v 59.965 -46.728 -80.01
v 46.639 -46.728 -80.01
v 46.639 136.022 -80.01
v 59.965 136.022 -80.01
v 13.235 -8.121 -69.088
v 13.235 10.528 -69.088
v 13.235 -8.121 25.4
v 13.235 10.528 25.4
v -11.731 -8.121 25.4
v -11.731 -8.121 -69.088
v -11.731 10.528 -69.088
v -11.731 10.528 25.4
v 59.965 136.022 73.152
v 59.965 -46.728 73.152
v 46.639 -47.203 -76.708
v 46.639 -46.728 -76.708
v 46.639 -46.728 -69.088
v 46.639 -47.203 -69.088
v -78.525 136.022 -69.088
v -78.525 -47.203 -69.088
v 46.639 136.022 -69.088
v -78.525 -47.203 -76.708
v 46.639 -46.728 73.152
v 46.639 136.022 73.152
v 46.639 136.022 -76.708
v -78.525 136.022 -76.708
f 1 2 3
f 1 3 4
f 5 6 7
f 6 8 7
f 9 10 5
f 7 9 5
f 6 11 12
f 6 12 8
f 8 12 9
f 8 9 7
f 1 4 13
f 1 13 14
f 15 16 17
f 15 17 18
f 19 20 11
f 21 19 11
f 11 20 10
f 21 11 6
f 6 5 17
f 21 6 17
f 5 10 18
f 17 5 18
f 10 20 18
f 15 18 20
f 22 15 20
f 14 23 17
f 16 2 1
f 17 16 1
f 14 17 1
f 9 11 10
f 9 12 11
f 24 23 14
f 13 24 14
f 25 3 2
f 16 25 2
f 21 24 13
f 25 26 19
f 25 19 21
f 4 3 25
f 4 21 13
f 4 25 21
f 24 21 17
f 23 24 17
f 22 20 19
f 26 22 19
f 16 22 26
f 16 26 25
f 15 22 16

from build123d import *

# Parameters (mm, degrees)
F0_W     = 24.9655246735
F0_H     = 18.6489485204
F1_DEPTH = 25.4
F2_W     = 24.9655246735
F2_H     = 18.6489485204
F3_DEPTH = 69.088
F4_W     = 24.9655246735
F4_H     = 18.6489485204
F5_DEPTH = 7.62
F4_W_2   = 13.3254788816
F4_H_2   = 182.7494688332
F6_DEPTH = 10.922
F7_DEPTH = 131.318


with BuildPart() as f1:
    # F0 (on Top) → F1 (new body)
    with BuildSketch(Plane.XY):
        with Locations((0.7519731298, 1.203157939)):
            Rectangle(F0_W, F0_H)
    extrude(amount=F1_DEPTH)

    # F2 (on face) → F3 (join)
    with BuildSketch(Plane(origin=(0, 0, 0), x_dir=(1, 0, 0), z_dir=(0, 0, -1))):
        with Locations((0.7519731298, -1.203157939)):
            Rectangle(F2_W, F2_H)
    extrude(amount=F3_DEPTH)

    # F4 (on face) → F5 (join)
    with BuildSketch(Plane(origin=(0, 0, -69.088), x_dir=(1, 0, 0), z_dir=(0, 0, -1))):
        Polygon((46.6391891241, 47.2034774721), (-78.5251632333, 47.2034774721), (-78.5251632333, -136.0218971968), (46.6391891241, -136.0218971968), (46.6391891241, 46.7275716364), align=None)
        with Locations((0.7519731298, -1.203157939)):
            Rectangle(F4_W, F4_H, mode=Mode.SUBTRACT)
        with Locations((0.7519731298, -1.203157939)):
            Rectangle(F4_W, F4_H)
    extrude(amount=F5_DEPTH)

    # F4 (on face) → F6 (join, symmetric)
    with BuildSketch(Plane(origin=(0, 0, -69.088), x_dir=(1, 0, 0), z_dir=(0, 0, -1))):
        with Locations((53.3019285649, -44.6471627802)):
            Rectangle(F4_W_2, F4_H_2)
    extrude(amount=F6_DEPTH, both=True)

    # F7 (add): a face of the model
    f7_faces = [f1.faces().sort_by_distance(p)[0] for p in [
        (53.3019285649, 44.6471627802, -58.166),
    ]]
    extrude(f7_faces, amount=F7_DEPTH)


solid = f1.part
